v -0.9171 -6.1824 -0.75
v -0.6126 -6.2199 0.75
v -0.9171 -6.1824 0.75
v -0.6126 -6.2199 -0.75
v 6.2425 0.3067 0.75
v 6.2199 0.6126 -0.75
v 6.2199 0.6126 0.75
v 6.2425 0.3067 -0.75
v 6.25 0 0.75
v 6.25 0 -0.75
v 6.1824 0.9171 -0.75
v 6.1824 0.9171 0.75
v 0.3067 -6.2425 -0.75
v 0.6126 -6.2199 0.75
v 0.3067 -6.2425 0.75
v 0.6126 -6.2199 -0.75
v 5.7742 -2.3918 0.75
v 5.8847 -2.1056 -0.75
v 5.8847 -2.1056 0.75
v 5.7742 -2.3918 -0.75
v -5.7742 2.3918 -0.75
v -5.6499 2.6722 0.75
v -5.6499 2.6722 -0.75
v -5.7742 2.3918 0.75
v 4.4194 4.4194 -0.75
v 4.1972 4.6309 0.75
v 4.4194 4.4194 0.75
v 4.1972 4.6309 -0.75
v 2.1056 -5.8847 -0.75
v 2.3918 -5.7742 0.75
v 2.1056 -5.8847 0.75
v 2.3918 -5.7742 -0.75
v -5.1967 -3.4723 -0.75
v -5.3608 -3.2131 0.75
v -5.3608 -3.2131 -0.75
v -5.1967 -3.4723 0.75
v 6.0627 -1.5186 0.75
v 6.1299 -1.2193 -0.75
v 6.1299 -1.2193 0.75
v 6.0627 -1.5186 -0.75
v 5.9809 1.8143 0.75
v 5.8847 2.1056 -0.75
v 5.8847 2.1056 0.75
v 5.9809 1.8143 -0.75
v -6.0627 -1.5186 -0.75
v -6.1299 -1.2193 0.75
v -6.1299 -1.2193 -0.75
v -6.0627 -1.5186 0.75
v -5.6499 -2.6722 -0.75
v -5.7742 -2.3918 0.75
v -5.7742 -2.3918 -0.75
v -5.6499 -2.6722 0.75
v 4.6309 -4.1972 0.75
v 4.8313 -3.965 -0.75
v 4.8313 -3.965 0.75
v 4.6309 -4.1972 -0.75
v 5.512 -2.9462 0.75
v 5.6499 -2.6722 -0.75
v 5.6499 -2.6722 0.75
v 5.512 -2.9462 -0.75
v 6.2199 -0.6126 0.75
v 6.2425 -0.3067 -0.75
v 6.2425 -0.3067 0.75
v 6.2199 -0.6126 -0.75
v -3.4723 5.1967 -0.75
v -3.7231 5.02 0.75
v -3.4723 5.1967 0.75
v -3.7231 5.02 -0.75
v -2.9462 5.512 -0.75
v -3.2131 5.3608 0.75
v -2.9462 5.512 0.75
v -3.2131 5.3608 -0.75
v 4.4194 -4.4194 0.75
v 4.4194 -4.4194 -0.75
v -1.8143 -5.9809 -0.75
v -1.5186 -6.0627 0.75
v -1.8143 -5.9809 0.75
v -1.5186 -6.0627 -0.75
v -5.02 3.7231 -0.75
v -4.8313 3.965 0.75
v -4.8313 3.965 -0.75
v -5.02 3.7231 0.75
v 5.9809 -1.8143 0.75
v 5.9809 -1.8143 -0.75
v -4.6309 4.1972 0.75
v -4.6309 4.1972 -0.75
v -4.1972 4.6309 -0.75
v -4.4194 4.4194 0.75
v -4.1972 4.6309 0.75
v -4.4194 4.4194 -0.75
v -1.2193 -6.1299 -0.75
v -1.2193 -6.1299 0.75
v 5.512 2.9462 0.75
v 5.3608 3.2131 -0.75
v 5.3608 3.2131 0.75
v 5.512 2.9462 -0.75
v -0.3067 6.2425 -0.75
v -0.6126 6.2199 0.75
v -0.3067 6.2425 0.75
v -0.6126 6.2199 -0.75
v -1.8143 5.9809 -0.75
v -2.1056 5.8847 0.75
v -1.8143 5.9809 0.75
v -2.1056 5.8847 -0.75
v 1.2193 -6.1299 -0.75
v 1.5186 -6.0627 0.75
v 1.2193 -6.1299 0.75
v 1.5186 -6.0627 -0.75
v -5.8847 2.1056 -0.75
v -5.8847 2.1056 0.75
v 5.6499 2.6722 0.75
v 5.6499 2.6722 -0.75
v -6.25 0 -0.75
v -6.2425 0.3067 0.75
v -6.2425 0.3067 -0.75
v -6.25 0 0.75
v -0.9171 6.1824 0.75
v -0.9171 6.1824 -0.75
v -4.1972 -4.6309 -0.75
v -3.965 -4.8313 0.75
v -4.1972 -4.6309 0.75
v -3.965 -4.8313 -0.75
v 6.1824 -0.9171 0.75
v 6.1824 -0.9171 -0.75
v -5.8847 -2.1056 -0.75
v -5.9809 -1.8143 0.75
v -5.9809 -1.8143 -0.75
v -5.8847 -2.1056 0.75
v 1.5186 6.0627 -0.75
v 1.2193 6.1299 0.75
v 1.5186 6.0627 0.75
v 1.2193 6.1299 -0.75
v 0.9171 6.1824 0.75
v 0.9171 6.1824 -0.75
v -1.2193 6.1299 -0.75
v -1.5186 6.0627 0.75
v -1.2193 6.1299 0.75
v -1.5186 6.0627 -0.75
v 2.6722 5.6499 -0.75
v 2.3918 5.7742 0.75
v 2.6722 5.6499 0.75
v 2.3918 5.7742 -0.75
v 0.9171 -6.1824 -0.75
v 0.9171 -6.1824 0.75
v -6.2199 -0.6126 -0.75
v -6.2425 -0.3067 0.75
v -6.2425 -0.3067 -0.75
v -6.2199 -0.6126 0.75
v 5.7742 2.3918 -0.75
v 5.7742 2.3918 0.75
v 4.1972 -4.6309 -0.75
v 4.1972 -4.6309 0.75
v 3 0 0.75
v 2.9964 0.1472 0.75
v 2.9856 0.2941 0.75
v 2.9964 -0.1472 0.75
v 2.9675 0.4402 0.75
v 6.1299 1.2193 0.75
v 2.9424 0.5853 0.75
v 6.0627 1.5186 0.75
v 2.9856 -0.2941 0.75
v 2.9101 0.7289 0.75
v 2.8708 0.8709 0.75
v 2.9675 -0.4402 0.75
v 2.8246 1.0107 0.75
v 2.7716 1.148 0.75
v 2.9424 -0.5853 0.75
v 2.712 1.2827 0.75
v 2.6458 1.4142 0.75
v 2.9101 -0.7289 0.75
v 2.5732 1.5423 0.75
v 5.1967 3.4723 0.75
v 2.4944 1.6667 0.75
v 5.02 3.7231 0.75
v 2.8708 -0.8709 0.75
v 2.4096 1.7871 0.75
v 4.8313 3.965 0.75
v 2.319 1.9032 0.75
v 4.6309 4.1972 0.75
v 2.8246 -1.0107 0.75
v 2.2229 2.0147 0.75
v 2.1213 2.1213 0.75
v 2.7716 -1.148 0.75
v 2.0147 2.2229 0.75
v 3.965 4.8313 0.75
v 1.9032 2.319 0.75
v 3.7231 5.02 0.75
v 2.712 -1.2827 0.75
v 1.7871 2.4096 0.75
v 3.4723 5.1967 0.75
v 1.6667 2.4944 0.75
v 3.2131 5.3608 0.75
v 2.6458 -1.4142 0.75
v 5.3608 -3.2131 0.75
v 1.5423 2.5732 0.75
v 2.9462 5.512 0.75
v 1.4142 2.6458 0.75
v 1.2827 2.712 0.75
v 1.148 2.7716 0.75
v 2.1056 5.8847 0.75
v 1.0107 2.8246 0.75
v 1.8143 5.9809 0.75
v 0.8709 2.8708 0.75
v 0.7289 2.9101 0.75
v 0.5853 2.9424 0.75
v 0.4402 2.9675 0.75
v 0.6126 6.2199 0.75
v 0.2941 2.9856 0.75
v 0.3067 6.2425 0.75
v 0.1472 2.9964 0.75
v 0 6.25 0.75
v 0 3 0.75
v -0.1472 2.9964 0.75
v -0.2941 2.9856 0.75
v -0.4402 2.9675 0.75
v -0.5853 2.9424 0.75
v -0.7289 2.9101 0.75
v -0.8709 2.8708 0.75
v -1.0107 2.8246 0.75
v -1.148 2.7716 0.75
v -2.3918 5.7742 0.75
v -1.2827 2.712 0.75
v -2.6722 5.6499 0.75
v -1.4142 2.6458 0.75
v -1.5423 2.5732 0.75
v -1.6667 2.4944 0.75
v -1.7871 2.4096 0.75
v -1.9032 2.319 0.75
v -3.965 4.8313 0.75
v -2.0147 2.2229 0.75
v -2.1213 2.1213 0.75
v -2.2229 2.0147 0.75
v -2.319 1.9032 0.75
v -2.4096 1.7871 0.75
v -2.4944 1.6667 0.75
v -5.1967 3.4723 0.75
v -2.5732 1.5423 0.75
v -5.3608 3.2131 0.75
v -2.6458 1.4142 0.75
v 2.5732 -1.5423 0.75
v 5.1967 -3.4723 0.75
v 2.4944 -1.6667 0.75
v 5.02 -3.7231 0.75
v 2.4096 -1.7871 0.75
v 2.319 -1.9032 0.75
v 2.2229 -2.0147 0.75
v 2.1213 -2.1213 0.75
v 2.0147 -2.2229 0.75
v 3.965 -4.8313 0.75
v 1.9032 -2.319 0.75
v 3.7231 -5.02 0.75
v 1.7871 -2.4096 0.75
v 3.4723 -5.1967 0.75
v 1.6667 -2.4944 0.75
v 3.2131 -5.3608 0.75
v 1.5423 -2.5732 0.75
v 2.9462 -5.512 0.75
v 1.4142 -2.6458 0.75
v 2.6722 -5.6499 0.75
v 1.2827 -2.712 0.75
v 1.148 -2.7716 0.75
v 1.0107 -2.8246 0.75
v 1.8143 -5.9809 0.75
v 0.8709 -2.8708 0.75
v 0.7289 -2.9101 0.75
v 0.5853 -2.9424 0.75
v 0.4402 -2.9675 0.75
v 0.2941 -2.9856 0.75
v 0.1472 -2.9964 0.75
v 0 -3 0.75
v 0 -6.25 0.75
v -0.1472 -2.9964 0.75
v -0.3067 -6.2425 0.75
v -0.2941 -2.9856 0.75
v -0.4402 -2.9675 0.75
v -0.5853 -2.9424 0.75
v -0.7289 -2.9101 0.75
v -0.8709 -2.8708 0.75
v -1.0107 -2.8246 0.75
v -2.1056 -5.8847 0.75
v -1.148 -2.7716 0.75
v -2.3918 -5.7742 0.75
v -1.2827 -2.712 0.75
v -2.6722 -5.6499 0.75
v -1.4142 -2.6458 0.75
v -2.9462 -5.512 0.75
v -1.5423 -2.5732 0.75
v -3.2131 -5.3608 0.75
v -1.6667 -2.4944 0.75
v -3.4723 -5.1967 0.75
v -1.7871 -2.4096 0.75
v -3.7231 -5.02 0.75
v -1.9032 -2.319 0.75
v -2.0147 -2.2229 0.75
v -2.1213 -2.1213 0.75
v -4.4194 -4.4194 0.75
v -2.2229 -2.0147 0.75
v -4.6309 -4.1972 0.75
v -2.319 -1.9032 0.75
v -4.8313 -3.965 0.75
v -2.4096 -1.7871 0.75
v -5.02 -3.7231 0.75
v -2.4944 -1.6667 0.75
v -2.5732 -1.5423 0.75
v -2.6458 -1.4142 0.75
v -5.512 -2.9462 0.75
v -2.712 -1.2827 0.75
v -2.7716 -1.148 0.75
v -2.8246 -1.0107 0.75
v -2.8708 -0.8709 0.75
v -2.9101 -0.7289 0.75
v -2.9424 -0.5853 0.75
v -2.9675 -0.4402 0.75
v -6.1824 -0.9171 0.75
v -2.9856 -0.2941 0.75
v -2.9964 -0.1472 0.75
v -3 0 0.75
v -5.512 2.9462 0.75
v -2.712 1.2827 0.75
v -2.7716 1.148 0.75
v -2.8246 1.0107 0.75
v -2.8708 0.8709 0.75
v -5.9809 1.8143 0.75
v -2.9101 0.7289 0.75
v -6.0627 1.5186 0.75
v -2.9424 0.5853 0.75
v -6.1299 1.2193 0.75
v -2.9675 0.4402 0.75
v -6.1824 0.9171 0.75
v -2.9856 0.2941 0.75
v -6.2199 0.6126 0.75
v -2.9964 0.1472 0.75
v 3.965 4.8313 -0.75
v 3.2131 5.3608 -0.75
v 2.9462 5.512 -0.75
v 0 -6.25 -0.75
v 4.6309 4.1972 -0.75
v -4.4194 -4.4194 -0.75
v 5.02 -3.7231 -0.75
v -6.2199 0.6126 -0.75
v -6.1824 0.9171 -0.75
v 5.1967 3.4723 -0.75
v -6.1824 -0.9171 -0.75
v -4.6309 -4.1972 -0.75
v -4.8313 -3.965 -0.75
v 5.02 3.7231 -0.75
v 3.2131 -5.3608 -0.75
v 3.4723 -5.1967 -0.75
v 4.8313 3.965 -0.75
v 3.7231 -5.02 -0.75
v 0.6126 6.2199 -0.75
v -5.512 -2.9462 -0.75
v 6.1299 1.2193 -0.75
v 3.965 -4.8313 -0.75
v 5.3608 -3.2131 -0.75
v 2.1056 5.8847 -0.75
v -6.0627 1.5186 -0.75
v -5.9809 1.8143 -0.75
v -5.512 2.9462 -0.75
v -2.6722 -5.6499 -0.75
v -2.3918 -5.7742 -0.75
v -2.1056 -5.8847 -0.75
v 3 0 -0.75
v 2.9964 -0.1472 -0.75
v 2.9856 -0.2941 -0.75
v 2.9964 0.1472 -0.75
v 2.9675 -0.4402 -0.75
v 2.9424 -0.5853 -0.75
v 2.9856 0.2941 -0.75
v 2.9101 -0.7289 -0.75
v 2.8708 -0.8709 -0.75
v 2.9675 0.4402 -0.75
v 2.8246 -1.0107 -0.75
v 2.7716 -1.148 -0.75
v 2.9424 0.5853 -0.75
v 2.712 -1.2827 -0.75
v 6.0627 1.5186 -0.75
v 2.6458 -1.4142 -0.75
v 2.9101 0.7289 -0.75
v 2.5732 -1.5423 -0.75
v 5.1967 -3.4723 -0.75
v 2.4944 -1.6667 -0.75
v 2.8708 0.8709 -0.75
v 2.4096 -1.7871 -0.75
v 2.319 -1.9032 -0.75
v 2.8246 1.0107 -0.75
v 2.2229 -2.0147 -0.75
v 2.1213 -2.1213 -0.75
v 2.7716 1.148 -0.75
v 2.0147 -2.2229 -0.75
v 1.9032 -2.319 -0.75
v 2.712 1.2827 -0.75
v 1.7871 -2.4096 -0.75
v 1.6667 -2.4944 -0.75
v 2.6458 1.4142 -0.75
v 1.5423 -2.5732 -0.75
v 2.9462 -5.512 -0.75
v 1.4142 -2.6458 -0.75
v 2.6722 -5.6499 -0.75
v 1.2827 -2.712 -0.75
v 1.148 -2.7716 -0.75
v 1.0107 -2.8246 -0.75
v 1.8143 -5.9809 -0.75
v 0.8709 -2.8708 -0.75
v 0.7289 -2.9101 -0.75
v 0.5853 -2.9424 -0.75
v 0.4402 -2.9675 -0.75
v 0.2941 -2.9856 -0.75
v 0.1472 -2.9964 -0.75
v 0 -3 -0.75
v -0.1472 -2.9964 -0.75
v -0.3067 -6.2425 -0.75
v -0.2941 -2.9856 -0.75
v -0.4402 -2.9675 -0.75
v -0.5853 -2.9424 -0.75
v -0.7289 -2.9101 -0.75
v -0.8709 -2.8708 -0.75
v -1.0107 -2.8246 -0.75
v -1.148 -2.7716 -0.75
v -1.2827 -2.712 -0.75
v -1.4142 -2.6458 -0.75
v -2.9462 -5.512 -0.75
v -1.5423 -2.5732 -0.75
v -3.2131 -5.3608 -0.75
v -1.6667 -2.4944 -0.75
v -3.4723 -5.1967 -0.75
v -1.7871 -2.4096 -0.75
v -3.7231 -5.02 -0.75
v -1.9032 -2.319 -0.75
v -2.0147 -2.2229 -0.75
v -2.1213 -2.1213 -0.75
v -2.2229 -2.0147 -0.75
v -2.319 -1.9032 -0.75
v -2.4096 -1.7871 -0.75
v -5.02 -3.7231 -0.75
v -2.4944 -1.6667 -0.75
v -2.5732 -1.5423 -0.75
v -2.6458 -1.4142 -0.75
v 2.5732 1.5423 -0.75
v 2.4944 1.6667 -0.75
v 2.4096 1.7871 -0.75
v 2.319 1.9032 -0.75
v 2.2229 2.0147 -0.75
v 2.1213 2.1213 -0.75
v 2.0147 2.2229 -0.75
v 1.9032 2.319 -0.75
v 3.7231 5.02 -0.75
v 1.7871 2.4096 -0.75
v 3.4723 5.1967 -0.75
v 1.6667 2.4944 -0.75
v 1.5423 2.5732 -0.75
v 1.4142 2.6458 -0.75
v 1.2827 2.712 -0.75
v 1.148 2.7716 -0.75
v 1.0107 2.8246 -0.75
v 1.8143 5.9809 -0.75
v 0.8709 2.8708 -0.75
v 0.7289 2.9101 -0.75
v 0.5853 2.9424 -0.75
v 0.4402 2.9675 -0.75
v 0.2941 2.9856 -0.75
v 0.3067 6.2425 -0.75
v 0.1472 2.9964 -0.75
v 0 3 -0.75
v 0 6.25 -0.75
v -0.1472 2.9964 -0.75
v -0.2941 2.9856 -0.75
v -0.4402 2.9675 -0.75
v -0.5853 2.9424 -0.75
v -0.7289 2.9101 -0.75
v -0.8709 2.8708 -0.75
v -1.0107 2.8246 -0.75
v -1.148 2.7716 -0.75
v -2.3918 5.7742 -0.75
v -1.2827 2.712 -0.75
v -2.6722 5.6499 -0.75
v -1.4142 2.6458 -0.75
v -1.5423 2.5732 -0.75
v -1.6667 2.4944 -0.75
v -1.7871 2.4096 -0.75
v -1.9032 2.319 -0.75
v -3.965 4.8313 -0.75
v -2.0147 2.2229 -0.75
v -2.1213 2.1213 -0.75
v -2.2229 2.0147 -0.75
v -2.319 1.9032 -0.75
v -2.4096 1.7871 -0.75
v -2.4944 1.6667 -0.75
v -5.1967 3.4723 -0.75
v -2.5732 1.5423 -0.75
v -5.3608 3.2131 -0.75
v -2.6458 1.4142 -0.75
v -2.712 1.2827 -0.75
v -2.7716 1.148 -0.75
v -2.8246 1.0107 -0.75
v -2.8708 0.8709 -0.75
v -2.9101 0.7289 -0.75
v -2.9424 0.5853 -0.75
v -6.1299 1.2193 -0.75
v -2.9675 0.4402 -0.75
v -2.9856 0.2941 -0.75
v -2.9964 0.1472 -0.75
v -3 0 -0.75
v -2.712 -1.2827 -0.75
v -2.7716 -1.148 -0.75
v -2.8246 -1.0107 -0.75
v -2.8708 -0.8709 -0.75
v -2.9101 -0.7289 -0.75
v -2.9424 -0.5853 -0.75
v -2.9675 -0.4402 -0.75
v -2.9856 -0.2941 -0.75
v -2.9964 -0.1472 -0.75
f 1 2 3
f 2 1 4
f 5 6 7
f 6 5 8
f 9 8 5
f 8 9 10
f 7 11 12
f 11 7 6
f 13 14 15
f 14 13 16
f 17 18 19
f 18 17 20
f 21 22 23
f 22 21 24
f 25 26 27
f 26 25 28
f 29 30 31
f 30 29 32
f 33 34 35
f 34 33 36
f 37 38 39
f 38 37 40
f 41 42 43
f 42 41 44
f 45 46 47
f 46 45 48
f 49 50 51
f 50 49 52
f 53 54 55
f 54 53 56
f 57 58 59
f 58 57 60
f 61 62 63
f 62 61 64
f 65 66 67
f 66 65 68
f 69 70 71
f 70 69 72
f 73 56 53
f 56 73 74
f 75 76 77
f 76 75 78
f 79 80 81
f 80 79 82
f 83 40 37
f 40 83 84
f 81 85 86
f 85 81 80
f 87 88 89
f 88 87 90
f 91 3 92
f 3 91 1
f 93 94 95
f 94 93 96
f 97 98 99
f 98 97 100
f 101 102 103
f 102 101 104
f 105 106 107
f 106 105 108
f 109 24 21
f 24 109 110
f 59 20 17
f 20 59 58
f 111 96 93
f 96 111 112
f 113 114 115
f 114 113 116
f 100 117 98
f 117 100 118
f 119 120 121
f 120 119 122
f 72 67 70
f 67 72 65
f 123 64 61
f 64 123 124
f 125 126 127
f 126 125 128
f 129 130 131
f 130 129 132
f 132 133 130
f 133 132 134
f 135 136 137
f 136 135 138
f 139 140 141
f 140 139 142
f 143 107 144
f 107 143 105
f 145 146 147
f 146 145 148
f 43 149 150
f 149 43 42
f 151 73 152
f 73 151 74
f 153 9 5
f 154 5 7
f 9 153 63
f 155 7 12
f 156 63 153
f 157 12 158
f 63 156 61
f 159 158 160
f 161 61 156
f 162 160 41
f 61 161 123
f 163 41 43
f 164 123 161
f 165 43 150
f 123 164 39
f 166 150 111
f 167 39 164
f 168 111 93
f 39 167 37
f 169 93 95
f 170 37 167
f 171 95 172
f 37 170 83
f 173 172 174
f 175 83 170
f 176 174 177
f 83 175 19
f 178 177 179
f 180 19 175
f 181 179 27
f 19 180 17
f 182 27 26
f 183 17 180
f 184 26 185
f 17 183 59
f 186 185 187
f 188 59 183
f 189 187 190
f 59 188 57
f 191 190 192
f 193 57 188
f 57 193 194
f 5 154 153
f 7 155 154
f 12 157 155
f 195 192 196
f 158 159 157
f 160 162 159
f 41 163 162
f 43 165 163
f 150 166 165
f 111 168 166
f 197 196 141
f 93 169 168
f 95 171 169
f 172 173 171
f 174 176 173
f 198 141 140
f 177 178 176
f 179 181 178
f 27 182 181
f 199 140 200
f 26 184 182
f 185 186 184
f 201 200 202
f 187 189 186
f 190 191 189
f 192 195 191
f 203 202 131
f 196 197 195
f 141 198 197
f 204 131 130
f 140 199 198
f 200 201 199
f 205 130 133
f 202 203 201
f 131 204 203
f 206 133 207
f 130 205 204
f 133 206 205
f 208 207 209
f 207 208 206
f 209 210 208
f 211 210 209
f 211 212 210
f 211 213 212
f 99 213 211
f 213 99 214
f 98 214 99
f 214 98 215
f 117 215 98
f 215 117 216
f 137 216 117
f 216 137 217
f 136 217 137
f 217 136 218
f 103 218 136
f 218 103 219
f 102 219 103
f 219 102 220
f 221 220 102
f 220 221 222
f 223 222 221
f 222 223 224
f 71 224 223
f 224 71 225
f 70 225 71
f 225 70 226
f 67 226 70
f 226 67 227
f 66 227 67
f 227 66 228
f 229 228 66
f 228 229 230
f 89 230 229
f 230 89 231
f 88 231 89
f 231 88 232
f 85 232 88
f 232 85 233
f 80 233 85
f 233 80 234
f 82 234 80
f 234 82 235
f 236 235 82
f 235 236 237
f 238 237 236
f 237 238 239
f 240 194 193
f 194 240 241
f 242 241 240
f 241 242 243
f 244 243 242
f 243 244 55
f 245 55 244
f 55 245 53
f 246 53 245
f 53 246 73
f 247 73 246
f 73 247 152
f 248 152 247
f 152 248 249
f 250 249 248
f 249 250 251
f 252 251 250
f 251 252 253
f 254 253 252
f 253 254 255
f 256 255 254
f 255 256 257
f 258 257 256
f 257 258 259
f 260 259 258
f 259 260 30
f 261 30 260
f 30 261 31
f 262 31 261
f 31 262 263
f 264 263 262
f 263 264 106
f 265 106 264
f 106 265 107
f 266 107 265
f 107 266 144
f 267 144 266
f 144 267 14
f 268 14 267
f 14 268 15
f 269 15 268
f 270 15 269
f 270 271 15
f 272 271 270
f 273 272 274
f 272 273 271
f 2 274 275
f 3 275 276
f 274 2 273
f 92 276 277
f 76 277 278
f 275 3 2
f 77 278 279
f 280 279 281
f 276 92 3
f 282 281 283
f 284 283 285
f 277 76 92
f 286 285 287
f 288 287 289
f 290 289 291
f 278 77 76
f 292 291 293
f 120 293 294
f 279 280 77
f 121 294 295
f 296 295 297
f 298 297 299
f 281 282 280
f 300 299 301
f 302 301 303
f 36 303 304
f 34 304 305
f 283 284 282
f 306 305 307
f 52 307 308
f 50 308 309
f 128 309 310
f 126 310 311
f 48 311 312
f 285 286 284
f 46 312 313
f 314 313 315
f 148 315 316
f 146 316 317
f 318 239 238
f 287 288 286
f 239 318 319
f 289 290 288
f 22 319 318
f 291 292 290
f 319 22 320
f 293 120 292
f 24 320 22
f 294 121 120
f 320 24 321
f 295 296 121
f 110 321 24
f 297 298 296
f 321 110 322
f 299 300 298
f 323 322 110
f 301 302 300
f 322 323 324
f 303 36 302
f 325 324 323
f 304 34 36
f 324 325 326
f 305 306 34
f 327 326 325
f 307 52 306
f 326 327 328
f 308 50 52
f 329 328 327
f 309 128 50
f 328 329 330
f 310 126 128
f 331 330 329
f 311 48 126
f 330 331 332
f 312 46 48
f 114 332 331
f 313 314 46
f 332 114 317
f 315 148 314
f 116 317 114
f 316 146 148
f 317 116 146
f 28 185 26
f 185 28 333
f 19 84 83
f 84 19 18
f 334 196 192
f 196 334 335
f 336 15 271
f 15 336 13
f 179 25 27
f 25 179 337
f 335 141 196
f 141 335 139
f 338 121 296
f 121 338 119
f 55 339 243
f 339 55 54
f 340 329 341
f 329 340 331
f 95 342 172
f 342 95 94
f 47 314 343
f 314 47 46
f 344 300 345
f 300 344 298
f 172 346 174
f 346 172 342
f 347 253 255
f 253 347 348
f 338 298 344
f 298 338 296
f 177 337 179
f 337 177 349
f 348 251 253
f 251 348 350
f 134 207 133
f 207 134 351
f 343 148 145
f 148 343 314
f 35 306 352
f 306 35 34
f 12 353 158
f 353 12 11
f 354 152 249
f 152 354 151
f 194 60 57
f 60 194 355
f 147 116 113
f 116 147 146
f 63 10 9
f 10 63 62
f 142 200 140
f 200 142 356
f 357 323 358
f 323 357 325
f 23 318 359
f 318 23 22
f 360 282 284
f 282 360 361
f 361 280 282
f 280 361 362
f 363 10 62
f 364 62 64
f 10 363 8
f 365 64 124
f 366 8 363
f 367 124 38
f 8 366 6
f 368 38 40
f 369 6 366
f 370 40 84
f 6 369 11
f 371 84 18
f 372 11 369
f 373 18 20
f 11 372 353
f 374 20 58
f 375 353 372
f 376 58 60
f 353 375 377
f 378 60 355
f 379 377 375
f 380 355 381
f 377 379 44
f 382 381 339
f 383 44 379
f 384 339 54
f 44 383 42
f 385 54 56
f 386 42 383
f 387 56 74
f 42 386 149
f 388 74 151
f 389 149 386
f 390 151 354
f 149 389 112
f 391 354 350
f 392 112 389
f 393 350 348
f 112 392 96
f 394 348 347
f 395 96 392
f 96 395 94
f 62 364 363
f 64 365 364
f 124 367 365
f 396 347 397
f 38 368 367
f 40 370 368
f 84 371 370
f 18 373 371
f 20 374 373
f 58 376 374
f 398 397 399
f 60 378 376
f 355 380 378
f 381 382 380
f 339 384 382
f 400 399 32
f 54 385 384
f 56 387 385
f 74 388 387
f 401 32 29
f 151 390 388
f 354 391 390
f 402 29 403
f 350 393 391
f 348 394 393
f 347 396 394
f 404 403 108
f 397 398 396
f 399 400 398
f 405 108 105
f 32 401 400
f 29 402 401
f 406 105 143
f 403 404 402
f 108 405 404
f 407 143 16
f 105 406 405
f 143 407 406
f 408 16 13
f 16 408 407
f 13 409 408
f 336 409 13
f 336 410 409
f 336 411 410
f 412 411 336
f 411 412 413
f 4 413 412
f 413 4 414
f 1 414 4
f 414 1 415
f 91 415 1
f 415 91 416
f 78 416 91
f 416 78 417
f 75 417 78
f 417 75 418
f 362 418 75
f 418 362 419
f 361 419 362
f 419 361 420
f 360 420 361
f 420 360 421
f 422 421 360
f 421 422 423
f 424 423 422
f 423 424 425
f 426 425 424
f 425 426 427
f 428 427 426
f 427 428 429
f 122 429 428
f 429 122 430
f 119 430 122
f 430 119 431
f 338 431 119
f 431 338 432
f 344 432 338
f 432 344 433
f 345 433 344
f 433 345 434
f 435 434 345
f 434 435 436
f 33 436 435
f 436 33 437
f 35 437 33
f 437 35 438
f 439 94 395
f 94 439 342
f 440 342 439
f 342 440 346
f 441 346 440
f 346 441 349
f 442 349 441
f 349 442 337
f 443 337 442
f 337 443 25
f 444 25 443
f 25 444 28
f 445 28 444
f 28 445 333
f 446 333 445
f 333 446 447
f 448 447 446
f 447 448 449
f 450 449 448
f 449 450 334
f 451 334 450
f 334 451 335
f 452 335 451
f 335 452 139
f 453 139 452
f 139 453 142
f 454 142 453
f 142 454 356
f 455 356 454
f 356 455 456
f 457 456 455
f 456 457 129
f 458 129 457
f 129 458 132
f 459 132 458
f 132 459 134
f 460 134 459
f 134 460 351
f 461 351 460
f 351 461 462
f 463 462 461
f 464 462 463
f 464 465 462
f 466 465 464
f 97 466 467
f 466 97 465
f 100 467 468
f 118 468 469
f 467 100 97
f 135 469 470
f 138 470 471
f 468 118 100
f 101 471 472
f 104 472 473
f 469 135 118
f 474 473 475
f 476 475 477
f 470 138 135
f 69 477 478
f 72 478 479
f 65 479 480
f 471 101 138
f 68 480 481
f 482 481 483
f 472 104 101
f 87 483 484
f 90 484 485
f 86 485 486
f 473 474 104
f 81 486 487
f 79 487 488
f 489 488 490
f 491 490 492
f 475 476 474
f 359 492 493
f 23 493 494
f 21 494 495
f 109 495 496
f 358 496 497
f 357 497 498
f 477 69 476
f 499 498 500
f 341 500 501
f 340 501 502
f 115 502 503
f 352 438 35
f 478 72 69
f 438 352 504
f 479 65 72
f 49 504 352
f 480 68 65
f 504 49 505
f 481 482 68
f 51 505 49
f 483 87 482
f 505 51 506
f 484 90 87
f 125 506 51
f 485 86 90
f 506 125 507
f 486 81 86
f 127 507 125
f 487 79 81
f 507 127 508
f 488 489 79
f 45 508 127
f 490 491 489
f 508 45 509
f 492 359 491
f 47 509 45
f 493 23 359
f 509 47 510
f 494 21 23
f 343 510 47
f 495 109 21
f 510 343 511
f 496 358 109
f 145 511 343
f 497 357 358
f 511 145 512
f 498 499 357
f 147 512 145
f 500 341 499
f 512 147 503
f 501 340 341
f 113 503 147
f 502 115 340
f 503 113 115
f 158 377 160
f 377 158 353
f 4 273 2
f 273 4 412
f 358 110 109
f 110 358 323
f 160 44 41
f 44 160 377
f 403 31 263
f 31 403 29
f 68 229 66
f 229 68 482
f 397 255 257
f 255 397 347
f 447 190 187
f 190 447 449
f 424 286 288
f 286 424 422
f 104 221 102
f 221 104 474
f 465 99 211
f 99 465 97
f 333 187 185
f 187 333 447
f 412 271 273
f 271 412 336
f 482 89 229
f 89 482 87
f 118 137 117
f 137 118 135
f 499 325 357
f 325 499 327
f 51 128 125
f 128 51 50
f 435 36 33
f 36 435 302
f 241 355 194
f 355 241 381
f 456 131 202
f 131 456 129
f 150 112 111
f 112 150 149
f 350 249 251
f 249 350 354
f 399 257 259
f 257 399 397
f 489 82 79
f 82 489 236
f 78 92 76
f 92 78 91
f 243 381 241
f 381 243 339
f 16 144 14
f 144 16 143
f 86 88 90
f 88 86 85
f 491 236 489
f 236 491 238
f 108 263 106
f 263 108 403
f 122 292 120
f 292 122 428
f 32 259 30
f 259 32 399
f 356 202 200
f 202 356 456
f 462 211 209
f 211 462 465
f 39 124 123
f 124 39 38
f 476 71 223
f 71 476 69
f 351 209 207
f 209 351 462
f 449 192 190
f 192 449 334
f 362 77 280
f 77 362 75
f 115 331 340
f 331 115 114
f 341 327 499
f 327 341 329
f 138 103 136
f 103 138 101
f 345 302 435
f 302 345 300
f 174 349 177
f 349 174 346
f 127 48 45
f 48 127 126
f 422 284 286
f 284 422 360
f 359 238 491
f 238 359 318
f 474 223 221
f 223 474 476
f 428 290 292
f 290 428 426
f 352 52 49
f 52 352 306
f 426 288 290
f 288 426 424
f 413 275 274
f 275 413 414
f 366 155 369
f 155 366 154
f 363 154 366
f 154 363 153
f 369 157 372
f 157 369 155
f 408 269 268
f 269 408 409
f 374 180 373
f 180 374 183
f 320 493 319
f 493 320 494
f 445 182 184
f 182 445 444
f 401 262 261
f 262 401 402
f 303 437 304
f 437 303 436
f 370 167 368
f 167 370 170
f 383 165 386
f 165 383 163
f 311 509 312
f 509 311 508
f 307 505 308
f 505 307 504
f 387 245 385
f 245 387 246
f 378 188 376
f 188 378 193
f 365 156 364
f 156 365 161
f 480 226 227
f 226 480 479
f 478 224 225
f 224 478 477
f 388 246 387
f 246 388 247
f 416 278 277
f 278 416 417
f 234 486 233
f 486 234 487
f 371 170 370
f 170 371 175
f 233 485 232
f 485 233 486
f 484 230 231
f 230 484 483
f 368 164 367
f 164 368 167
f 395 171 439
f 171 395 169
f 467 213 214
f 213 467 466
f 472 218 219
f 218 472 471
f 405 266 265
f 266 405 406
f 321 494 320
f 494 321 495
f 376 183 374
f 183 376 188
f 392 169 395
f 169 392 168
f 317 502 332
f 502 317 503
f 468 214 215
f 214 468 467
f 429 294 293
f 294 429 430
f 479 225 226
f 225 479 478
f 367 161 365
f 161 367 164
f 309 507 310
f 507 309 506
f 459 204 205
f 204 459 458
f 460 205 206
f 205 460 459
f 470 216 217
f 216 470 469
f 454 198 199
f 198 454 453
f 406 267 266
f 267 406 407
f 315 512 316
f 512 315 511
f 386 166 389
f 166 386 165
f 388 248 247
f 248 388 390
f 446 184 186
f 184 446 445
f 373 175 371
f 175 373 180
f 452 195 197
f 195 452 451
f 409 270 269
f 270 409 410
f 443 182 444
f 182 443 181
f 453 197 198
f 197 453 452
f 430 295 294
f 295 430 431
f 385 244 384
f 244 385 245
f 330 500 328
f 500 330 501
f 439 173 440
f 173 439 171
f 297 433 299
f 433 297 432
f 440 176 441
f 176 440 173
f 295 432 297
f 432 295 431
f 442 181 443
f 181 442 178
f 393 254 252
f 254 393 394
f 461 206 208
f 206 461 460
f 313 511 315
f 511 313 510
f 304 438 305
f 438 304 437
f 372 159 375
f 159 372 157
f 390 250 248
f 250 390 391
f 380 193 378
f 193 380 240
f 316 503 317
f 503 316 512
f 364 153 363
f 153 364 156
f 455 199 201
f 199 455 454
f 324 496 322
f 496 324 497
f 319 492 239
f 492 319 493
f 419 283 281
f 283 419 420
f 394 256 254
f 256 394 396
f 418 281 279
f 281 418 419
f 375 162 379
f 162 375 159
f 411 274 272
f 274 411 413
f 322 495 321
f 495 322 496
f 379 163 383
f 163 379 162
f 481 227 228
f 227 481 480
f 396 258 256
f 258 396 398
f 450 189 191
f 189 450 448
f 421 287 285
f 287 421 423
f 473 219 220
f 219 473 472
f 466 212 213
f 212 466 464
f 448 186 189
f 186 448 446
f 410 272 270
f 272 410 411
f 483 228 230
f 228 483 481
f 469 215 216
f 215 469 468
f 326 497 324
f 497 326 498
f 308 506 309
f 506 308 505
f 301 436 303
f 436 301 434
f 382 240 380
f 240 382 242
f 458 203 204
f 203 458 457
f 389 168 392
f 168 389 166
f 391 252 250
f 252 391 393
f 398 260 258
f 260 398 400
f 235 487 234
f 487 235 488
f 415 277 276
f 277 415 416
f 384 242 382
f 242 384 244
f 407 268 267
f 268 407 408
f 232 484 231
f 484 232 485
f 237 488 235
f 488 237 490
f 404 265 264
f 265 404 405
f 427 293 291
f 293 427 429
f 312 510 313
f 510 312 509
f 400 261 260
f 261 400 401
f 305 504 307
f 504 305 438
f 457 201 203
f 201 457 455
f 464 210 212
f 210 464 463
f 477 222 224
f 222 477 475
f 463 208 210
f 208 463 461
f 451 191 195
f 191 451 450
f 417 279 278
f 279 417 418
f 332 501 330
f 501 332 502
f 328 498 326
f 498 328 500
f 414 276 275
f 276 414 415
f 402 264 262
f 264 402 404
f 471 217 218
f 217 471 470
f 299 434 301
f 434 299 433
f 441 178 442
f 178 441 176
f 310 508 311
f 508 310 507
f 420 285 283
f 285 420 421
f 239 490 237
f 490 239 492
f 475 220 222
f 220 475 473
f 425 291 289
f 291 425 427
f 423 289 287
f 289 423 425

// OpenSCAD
$fn=128;

module washer(id=6.0, od=12.5, thickness=1.5) {
    difference() {
        cylinder(h=thickness, d=od, center=true);
        cylinder(h=thickness + 0.2, d=id, center=true);
    }
}

washer();
